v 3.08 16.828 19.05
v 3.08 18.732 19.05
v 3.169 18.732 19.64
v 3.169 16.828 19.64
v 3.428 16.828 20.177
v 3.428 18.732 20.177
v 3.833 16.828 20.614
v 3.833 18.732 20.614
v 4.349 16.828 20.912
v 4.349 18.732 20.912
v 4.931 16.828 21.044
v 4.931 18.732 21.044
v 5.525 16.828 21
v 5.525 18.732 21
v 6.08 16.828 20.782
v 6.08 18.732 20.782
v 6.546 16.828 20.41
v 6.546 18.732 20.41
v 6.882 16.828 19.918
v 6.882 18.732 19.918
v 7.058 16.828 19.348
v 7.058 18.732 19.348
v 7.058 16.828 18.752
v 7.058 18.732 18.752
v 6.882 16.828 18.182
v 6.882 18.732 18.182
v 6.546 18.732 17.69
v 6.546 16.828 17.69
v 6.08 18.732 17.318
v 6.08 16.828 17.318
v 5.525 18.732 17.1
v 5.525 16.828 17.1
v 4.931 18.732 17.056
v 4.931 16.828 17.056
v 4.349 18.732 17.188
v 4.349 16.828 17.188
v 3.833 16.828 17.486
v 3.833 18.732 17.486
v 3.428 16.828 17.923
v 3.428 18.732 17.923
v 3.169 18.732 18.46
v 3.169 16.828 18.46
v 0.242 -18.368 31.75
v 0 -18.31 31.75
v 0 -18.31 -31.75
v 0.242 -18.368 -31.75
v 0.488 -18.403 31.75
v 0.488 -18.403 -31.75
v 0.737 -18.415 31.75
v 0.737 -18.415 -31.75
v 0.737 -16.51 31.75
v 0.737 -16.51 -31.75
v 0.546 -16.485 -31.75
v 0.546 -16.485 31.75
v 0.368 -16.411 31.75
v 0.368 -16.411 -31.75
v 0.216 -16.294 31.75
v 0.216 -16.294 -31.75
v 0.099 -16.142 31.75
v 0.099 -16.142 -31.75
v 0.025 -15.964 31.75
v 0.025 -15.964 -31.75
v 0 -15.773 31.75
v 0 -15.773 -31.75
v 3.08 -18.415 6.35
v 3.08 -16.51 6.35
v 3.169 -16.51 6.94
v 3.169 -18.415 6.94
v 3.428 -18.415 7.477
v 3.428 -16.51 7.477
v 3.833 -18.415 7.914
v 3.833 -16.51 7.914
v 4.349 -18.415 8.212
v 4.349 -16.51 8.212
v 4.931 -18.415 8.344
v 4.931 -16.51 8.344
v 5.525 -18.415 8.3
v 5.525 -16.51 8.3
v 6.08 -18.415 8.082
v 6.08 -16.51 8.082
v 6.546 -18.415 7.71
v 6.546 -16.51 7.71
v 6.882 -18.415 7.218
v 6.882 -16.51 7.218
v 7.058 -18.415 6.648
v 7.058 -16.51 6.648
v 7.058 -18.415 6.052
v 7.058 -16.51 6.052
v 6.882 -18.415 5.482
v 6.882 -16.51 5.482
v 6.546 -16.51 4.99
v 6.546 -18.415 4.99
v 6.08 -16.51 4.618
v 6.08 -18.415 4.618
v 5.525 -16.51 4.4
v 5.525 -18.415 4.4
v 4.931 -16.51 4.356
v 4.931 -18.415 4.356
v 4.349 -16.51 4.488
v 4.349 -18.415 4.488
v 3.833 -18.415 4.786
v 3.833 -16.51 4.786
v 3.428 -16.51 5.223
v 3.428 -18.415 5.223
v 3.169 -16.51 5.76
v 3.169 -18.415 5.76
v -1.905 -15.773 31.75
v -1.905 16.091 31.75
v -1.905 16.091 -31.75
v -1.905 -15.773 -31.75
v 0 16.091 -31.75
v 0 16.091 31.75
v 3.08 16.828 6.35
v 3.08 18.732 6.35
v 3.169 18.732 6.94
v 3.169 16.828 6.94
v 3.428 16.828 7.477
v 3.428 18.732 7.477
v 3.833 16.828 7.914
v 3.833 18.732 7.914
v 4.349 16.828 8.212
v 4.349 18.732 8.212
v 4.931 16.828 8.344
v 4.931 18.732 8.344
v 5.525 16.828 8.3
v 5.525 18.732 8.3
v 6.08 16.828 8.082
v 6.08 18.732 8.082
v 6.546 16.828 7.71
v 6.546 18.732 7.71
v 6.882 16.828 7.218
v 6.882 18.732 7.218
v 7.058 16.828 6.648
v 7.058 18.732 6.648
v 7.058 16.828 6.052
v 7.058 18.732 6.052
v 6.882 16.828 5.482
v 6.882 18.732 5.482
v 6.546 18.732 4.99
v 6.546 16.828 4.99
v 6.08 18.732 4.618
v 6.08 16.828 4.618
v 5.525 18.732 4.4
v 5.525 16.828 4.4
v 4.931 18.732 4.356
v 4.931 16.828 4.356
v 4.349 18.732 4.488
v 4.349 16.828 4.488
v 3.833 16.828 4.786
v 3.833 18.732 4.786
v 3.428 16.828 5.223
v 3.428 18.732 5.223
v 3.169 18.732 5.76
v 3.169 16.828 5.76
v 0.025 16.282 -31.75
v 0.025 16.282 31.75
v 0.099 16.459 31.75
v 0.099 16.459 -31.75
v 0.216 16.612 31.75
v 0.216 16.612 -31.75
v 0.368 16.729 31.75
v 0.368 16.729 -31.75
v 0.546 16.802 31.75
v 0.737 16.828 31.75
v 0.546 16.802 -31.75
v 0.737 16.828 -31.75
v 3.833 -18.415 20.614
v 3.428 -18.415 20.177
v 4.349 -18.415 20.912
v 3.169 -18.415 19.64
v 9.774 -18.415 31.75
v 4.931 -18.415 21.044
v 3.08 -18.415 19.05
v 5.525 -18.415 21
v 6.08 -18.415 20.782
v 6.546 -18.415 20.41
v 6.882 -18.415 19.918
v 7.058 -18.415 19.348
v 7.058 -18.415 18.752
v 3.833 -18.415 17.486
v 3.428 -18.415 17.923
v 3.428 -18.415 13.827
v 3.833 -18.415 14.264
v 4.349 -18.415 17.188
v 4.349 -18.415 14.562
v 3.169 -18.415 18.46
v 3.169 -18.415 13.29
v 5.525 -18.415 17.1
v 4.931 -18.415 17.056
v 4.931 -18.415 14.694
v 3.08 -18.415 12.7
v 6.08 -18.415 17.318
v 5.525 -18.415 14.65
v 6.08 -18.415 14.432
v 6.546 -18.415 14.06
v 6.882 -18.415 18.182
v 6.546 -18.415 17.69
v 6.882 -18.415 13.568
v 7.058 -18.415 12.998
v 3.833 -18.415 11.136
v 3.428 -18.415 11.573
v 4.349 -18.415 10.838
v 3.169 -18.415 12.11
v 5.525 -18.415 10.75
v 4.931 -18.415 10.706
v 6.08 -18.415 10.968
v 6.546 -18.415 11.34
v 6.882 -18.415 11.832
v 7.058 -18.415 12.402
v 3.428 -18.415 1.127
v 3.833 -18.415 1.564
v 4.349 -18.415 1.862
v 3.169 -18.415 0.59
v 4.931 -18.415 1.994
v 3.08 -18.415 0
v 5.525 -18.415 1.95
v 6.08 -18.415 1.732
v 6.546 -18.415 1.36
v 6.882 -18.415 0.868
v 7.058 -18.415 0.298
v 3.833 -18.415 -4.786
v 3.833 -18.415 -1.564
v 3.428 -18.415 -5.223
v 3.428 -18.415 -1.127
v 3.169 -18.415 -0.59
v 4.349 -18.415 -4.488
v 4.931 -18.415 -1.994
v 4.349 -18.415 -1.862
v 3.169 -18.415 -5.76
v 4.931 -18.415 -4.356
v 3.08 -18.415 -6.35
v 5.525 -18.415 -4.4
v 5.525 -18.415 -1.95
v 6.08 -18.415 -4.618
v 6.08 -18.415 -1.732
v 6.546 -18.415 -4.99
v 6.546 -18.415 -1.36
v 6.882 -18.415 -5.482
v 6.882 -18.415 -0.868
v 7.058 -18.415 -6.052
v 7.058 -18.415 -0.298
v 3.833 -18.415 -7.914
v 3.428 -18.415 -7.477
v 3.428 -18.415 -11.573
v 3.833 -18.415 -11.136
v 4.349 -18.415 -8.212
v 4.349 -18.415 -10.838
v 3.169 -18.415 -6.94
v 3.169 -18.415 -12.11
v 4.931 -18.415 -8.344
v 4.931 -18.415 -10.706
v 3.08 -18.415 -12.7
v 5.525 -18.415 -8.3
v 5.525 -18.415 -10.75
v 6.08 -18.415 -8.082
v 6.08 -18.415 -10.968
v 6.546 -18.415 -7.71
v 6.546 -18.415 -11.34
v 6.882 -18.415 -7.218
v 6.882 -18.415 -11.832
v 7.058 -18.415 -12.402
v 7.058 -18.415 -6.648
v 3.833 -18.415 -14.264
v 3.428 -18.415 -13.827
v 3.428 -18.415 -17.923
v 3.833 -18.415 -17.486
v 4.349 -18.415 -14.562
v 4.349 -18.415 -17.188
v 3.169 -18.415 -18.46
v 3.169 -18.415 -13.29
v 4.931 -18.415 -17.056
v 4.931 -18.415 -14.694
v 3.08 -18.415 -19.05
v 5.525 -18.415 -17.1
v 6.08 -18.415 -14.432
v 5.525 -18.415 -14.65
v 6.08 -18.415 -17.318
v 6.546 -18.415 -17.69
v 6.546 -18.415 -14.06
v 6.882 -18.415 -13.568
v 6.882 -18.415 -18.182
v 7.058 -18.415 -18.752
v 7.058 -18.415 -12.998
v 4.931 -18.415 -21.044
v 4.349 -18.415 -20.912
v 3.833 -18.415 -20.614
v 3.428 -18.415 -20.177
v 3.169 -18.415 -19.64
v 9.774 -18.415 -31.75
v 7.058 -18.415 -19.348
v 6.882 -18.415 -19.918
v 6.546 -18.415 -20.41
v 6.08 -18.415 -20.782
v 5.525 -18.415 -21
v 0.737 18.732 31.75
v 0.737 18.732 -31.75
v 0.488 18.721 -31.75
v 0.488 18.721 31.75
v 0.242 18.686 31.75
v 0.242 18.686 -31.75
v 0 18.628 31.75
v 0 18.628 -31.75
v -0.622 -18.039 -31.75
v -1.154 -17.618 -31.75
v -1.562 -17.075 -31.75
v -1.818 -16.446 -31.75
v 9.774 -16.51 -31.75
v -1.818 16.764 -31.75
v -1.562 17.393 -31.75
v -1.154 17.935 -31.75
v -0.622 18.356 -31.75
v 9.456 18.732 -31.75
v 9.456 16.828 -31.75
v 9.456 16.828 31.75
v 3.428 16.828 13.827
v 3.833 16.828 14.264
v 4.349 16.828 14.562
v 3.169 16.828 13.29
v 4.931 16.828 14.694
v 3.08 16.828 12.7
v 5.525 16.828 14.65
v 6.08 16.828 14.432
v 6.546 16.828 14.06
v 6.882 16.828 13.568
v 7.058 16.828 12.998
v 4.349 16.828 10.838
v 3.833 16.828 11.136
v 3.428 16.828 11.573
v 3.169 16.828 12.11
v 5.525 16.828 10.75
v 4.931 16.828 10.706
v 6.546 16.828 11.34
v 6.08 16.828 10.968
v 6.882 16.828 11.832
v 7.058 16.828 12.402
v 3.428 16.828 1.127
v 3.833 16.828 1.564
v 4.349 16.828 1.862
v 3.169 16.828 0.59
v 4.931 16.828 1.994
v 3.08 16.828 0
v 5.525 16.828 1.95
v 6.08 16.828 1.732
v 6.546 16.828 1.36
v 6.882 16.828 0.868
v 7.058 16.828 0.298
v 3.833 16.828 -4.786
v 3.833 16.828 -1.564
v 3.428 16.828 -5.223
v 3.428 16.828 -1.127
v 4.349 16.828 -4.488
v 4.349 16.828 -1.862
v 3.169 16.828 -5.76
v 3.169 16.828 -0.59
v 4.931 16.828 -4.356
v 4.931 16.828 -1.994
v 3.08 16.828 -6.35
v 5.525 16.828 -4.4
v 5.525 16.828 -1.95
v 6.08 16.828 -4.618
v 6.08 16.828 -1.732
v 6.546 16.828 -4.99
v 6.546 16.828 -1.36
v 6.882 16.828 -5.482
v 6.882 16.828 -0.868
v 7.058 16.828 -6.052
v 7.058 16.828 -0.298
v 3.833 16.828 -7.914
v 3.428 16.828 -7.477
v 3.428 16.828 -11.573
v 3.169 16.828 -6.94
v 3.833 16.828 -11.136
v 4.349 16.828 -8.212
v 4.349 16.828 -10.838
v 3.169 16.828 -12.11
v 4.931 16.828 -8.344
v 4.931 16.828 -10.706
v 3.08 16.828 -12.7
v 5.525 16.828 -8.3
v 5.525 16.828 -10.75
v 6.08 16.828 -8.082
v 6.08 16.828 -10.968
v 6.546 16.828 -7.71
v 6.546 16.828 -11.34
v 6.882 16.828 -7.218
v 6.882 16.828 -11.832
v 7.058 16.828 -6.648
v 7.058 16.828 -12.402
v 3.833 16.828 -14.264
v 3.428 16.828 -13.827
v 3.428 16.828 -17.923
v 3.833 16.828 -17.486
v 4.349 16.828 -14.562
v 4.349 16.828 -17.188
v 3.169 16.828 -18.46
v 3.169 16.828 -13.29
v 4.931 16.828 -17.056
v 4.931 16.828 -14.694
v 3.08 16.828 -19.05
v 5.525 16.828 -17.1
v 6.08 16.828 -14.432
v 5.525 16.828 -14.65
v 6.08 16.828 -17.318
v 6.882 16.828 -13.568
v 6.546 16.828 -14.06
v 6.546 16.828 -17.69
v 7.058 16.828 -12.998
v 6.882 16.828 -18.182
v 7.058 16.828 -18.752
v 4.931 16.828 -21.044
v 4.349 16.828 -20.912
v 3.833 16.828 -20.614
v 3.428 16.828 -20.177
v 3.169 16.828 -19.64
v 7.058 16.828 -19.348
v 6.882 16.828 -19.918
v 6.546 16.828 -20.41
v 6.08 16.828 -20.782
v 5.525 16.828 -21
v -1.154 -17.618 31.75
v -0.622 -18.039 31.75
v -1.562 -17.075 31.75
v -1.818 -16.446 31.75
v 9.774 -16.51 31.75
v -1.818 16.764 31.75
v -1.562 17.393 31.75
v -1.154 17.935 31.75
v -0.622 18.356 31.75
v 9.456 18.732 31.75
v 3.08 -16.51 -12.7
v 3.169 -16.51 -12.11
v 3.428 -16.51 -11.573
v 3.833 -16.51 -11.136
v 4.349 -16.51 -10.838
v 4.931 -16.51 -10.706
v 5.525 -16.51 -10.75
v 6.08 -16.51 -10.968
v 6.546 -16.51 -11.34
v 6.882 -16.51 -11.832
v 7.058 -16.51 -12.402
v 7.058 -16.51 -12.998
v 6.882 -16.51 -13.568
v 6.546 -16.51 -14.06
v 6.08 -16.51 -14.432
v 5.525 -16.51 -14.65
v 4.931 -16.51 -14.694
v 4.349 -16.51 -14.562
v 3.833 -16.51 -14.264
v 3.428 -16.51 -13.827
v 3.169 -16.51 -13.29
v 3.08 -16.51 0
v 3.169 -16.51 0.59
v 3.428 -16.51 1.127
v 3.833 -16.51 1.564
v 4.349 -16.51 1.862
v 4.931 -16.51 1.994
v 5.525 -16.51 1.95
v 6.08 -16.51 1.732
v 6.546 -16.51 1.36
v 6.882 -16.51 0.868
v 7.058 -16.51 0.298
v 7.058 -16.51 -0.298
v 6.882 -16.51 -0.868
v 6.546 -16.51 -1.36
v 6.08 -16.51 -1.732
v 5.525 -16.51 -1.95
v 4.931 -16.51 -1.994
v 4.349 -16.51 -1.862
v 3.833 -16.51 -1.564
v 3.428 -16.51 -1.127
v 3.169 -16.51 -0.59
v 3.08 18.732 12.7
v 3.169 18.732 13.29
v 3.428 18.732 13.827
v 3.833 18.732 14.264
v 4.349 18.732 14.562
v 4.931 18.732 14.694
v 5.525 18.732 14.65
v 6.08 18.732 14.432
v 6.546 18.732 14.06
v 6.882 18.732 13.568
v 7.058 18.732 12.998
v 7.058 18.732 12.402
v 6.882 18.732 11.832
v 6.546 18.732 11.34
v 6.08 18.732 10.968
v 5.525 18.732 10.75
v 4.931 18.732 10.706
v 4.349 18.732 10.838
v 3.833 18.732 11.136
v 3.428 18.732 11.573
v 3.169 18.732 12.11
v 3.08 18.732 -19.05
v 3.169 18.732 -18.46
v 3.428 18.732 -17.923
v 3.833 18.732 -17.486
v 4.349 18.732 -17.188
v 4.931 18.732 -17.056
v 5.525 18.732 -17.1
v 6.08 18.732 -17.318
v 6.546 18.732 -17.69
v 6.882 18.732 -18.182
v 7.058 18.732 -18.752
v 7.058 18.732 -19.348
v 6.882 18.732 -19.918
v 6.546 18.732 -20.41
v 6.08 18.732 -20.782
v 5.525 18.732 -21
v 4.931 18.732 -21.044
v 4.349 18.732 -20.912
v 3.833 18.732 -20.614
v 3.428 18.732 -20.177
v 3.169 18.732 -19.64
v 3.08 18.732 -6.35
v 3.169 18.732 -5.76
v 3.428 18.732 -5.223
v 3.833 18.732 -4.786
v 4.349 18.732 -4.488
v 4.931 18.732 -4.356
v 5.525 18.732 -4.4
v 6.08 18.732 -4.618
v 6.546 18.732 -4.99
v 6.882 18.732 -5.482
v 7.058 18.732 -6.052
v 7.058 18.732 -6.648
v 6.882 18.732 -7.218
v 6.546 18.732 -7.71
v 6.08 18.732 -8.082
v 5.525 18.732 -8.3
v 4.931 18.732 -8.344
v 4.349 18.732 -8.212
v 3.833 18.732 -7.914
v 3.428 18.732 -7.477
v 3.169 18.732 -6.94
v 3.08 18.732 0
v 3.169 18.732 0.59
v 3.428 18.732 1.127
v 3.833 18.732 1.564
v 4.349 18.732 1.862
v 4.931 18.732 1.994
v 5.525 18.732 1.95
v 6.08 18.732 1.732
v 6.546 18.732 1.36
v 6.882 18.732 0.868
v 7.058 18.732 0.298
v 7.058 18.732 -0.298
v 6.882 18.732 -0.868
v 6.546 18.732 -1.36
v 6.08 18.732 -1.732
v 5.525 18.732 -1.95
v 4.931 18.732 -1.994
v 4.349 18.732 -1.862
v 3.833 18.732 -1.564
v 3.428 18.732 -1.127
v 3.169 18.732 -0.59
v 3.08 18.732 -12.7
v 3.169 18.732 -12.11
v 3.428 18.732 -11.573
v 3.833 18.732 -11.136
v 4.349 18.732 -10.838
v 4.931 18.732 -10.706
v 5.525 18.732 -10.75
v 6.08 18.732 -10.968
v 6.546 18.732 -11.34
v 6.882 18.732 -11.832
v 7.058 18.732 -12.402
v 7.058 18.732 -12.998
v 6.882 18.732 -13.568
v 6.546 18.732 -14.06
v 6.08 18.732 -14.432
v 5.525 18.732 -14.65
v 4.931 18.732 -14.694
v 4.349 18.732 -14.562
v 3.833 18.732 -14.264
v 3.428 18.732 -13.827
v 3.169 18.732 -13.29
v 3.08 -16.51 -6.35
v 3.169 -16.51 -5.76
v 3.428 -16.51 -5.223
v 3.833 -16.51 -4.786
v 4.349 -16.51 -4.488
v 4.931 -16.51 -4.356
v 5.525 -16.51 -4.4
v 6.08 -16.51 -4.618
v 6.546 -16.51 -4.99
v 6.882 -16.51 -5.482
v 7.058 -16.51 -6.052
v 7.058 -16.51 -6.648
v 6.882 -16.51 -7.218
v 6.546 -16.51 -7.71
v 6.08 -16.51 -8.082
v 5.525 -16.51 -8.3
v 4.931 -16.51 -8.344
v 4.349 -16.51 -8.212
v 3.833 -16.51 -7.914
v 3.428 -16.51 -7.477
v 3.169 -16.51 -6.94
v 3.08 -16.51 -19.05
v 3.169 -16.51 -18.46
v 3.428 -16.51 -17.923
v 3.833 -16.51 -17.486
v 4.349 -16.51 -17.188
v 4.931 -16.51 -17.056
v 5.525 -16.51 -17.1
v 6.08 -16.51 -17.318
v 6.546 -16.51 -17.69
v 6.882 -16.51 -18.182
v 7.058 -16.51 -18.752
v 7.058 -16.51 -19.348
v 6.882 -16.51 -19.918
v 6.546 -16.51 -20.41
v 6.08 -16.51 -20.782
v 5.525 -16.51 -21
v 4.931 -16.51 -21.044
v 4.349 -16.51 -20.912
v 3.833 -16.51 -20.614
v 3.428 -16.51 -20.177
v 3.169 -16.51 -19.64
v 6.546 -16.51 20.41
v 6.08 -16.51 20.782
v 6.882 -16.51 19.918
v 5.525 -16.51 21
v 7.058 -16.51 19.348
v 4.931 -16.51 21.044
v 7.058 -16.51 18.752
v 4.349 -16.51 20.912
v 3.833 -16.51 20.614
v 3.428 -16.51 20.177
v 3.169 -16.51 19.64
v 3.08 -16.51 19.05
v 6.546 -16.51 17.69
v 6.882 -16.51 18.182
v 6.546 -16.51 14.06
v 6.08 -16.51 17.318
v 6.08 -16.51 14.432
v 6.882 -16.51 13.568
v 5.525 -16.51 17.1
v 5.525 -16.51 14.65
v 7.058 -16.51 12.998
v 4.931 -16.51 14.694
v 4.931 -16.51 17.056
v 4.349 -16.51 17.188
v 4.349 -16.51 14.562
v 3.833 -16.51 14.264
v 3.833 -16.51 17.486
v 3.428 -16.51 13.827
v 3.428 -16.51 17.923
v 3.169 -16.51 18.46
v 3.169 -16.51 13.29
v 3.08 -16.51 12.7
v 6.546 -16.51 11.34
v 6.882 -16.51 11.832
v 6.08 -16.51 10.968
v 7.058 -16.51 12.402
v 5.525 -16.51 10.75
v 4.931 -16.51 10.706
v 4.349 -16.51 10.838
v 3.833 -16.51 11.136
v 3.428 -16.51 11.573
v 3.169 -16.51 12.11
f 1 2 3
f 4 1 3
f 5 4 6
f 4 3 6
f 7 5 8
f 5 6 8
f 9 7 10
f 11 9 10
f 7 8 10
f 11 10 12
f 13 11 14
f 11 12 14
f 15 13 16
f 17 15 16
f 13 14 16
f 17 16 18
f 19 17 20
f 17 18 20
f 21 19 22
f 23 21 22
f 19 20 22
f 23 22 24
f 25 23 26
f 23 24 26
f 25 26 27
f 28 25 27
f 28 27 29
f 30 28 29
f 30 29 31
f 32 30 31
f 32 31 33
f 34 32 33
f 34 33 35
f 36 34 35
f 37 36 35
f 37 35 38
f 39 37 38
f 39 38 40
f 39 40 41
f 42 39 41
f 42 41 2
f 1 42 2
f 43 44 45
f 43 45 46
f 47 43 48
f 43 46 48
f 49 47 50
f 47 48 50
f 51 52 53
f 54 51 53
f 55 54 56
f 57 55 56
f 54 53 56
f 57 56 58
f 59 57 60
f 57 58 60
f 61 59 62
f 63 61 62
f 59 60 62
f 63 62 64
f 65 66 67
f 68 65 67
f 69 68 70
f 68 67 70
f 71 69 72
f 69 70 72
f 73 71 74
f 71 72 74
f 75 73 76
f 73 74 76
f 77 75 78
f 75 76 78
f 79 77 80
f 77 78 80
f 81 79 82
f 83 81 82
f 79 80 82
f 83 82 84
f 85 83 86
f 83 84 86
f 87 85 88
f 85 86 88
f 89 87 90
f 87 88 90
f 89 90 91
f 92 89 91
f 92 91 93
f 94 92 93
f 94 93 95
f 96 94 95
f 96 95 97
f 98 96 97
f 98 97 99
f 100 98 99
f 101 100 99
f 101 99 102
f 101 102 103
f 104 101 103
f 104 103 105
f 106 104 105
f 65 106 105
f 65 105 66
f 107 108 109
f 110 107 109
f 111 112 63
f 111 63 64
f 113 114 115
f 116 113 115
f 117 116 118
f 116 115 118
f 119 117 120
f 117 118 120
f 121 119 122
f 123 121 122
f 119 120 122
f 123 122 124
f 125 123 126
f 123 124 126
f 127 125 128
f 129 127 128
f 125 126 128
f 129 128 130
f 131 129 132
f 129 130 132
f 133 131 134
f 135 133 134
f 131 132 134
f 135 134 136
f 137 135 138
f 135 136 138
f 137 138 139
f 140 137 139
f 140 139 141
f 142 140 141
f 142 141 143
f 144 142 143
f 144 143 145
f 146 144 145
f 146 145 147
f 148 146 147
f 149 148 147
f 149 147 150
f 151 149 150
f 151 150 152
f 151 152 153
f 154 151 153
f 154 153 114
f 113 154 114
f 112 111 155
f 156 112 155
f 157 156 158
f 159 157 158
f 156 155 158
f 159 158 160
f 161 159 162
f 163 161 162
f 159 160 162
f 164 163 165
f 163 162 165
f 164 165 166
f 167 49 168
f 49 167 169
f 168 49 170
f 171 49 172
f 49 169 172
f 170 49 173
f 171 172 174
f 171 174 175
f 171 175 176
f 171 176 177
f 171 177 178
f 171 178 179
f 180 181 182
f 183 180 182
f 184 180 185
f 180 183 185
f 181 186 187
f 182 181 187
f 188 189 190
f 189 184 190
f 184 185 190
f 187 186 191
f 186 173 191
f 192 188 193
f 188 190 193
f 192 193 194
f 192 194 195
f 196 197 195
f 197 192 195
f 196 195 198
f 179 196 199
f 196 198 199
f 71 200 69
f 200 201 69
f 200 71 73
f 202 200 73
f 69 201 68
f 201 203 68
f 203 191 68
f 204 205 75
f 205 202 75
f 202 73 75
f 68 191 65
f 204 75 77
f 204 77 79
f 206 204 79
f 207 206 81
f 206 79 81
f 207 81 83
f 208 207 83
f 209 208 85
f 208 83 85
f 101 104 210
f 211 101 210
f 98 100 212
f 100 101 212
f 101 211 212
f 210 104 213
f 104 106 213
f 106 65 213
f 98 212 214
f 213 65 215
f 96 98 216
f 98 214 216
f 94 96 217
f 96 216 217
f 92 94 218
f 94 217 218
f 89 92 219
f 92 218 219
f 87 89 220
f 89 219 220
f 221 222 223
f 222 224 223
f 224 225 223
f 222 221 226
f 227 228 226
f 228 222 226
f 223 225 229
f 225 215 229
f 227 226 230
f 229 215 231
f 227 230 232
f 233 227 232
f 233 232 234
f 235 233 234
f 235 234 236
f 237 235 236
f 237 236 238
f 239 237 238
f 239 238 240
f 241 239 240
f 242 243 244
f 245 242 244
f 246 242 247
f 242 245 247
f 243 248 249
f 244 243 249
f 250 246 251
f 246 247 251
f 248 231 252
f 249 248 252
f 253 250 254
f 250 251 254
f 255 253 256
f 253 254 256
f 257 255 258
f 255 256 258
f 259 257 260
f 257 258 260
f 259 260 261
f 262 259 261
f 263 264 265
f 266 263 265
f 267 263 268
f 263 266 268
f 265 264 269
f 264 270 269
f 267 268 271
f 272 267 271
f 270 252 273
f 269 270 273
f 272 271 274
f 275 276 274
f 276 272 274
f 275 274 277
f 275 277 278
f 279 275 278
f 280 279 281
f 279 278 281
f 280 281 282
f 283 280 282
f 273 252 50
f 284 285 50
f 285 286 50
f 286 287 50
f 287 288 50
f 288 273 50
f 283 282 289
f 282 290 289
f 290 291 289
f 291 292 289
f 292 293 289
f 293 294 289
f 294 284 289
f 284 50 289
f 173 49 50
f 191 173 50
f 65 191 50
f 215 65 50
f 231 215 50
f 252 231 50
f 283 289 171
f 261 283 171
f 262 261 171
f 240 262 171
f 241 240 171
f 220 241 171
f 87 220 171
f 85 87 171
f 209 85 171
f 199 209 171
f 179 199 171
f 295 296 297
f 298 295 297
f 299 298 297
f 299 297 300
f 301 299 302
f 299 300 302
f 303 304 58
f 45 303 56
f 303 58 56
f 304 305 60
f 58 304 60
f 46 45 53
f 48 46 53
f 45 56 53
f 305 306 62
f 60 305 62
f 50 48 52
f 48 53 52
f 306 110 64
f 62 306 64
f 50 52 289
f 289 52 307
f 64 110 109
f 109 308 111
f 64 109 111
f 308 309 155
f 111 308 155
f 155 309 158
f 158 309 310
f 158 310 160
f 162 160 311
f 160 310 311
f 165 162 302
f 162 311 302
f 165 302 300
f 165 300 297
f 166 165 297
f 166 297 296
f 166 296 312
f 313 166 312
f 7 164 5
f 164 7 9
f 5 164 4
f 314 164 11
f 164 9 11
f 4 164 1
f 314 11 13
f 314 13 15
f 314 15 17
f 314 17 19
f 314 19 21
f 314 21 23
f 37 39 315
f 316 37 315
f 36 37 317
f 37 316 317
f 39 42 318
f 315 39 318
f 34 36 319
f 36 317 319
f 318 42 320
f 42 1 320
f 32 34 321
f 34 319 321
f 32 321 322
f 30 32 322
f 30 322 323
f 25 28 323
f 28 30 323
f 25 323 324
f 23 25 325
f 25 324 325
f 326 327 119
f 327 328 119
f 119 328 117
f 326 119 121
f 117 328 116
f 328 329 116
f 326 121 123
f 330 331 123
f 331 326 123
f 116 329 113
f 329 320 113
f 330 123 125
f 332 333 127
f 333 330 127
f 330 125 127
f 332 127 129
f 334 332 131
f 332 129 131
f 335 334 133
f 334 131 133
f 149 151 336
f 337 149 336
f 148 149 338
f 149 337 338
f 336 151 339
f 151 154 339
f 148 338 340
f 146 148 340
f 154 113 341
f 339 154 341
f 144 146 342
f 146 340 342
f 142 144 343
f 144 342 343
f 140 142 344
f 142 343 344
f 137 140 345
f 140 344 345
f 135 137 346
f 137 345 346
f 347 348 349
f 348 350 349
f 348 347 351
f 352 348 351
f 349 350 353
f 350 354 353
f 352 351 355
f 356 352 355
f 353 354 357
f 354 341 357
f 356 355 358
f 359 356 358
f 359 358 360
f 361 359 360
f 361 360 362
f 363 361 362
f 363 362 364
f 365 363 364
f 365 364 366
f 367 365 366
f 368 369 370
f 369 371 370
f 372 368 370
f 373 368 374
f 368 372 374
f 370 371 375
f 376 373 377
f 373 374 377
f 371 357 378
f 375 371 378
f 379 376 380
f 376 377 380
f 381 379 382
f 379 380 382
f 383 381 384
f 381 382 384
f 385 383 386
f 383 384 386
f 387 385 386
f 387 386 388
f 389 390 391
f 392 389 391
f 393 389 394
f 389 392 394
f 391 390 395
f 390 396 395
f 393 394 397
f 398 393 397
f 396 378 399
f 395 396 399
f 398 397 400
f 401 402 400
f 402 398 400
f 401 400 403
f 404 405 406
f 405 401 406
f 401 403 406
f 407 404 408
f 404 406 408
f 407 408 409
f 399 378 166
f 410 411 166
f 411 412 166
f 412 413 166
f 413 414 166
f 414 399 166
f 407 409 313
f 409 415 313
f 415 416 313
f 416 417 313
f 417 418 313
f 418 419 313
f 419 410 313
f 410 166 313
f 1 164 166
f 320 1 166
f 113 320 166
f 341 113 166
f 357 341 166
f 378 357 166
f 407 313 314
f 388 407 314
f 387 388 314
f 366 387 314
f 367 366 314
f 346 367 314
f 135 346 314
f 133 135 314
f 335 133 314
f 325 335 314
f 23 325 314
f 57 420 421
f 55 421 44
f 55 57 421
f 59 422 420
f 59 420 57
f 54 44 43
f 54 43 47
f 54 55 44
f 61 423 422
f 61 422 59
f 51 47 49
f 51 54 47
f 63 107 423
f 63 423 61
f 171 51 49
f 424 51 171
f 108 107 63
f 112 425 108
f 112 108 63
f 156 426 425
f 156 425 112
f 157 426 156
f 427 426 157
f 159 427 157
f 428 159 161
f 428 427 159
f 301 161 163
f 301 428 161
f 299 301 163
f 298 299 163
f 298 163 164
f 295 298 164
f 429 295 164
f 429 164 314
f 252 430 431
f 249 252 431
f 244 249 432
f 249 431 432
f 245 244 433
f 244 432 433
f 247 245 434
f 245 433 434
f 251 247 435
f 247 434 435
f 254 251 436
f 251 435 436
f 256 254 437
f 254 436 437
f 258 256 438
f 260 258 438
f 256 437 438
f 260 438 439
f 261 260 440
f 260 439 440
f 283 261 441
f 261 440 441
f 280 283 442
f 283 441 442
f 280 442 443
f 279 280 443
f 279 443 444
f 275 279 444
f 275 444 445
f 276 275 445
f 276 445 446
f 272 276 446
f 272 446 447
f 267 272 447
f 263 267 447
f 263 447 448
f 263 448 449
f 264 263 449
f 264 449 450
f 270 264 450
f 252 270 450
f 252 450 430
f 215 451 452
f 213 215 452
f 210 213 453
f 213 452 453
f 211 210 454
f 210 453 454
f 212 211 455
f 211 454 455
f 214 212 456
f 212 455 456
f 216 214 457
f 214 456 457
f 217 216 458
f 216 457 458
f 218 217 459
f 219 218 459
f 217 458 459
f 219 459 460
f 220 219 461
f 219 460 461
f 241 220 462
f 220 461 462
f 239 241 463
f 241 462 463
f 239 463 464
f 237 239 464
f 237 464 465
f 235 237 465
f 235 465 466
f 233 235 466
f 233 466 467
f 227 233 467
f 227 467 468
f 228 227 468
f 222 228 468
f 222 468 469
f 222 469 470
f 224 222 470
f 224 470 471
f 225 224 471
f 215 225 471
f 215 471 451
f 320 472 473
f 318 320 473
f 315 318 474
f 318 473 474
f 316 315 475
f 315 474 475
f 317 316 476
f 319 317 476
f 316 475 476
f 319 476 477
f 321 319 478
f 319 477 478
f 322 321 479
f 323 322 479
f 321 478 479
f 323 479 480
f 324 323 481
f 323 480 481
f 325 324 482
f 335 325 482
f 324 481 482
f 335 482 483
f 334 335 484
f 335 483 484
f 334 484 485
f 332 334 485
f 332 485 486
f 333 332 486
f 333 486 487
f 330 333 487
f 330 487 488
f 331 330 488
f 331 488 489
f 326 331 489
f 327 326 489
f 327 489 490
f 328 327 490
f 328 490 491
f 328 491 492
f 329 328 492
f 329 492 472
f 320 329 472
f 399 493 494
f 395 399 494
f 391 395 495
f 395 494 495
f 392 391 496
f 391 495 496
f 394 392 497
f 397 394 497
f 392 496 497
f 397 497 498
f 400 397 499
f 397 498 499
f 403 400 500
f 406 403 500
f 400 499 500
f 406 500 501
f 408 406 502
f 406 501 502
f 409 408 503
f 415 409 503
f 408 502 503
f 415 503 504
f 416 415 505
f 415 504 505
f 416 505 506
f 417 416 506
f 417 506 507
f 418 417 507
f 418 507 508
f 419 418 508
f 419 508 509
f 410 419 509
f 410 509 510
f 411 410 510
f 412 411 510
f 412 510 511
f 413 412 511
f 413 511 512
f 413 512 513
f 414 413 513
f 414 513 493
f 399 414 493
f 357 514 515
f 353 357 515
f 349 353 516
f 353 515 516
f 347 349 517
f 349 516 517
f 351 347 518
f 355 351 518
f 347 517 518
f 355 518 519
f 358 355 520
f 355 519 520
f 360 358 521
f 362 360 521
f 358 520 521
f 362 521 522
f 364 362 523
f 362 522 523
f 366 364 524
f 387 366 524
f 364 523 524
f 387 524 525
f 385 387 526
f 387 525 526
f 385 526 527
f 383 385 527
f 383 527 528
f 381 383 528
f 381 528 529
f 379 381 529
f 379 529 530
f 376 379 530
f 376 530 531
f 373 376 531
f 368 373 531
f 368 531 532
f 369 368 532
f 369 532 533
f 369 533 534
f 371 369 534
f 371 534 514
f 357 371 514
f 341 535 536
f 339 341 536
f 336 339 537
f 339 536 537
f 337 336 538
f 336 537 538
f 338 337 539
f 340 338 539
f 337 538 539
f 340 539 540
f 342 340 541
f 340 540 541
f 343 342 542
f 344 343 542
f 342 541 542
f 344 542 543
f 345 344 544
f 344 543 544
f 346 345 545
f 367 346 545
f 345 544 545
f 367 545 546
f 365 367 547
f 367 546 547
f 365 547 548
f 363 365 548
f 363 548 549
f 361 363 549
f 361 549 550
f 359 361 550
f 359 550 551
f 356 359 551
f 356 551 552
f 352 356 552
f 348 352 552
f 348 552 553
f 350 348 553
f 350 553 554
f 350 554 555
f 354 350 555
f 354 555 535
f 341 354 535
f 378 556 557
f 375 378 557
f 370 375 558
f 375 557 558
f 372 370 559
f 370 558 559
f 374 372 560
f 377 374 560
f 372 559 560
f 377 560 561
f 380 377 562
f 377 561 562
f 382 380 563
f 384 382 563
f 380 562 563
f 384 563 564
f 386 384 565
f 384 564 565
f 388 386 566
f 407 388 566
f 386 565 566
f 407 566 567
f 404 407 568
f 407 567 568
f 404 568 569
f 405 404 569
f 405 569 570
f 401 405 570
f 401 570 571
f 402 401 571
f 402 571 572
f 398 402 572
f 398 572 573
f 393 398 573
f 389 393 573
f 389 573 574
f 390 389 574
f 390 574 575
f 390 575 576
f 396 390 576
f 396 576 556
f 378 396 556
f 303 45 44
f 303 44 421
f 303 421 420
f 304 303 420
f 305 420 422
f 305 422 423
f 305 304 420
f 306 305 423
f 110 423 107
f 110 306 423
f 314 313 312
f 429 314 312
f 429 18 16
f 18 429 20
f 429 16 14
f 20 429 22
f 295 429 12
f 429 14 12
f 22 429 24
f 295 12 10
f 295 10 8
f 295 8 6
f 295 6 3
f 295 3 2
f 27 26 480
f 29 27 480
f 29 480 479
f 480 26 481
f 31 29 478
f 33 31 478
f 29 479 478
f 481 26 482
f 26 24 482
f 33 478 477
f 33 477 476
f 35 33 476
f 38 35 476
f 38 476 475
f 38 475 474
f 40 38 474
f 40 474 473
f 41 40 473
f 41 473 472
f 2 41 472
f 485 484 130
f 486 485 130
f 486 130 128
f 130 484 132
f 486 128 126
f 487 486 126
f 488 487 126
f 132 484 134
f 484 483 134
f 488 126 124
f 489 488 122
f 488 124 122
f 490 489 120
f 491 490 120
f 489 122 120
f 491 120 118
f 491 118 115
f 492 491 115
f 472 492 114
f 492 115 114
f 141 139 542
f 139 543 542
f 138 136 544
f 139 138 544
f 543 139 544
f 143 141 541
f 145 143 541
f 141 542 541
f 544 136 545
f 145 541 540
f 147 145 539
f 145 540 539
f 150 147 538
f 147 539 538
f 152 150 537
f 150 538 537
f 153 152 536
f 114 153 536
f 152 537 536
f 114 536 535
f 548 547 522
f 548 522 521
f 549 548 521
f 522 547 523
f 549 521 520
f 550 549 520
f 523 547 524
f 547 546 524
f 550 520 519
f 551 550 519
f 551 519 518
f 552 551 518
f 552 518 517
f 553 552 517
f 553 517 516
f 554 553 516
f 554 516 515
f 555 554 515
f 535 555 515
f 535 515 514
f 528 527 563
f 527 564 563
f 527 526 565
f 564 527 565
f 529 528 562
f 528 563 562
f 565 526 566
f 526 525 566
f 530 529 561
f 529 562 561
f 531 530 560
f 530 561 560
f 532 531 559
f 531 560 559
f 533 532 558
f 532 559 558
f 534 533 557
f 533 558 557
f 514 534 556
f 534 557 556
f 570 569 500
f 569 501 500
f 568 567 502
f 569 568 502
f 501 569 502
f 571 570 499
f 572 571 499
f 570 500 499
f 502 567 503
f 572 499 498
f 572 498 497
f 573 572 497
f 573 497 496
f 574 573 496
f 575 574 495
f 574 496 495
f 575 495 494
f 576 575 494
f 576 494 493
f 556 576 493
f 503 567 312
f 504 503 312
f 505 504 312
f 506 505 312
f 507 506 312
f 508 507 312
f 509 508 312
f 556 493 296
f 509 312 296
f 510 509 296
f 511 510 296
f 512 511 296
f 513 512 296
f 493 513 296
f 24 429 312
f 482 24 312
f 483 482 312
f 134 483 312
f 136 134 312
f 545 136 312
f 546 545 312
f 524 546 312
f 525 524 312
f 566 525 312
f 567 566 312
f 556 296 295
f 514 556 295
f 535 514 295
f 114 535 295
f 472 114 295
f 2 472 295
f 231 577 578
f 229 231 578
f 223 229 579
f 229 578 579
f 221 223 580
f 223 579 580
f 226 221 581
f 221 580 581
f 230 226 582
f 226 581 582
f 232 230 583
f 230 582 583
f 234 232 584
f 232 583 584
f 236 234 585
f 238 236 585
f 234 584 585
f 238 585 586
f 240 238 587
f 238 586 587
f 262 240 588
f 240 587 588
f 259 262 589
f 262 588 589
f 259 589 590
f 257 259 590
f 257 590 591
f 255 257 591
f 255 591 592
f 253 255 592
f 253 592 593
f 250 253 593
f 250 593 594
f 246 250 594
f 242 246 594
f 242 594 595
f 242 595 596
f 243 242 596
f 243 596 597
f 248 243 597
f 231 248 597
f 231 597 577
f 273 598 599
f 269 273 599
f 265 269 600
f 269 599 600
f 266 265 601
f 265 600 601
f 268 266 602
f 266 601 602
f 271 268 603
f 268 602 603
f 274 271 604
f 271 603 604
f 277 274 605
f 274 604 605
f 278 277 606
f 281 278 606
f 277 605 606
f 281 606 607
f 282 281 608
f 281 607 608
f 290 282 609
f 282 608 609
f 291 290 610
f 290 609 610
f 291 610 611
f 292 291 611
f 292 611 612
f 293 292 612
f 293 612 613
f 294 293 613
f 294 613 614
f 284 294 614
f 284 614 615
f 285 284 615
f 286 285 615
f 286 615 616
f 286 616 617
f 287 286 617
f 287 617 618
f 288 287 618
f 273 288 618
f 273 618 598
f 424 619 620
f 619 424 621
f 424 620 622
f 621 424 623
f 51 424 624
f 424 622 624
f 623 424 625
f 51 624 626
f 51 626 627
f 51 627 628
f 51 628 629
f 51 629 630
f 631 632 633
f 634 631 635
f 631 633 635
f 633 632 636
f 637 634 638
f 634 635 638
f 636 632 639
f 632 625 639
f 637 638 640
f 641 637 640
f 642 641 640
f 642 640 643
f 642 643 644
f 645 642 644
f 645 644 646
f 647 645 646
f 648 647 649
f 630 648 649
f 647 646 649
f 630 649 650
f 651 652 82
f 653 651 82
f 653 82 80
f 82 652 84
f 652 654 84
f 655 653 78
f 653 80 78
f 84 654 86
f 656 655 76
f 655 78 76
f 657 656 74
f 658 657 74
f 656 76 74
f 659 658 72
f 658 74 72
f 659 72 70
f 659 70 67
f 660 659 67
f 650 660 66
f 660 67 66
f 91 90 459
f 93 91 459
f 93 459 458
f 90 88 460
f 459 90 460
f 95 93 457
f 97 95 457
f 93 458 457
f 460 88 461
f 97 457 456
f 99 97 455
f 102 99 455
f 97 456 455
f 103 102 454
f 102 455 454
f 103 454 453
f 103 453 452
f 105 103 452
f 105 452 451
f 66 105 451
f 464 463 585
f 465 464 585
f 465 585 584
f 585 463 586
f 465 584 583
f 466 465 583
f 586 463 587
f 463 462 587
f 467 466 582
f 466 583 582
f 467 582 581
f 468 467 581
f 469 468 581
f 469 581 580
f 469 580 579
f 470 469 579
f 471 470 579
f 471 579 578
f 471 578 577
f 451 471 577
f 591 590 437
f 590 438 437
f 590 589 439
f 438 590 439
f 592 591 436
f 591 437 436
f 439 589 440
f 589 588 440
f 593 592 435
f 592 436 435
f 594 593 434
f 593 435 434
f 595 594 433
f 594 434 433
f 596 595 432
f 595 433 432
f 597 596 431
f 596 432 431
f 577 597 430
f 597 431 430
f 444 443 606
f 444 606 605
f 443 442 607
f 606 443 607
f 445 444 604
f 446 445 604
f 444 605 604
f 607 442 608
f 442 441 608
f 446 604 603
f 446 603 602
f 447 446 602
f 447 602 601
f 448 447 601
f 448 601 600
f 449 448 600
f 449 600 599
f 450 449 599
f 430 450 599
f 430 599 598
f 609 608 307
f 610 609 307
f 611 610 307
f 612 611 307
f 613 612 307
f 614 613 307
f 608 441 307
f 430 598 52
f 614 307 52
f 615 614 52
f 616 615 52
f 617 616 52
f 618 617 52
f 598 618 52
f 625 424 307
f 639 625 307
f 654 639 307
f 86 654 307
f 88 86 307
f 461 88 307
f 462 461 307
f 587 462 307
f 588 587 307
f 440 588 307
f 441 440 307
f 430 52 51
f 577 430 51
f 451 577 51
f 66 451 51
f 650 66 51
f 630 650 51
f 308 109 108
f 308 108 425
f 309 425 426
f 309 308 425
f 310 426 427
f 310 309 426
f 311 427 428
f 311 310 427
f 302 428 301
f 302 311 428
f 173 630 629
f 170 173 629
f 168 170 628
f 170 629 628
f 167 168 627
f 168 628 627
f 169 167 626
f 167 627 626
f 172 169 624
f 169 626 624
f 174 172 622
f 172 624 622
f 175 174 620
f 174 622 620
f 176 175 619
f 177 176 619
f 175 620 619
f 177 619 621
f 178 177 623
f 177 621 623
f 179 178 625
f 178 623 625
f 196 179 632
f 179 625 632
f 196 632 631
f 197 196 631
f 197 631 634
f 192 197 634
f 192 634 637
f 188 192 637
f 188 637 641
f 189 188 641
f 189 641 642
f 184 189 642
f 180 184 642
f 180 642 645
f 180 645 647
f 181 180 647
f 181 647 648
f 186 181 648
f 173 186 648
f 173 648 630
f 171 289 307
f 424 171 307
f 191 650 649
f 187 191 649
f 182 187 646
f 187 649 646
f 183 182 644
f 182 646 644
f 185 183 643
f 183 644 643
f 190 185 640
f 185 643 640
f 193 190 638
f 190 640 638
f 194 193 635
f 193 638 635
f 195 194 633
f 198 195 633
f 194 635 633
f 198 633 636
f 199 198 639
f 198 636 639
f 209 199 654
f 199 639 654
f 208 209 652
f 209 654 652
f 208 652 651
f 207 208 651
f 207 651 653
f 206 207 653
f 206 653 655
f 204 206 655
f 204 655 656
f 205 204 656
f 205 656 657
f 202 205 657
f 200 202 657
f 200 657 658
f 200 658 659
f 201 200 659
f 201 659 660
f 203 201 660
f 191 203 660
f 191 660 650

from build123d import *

# Parameters (mm, degrees)
SKETCH4_W              = 63.5
SKETCH4_H              = 54.9275
BASE_FLANGE1_DEPTH     = 1.905
SKETCHED_START         = -31.75
SKETCHED_BEND3_DEPTH   = 63.5
SKETCHED_BEND3_2_DEPTH = 63.5
CUT_EXTRUDE2_REACH     = 51.835
SKETCH20_R             = 2


# Read off the part's stored shape, not the designer's step: Sketched Bend3
# Sheet-metal steps are written as plain solids
with BuildPart() as part:
    # Sketch4 → Base-Flange1 (new body)
    with BuildSketch(Plane(origin=(0, 0, 0), x_dir=(0, 0, -1), z_dir=(1, 0, 0))):
        Rectangle(SKETCH4_W, SKETCH4_H)
    extrude(amount=-BASE_FLANGE1_DEPTH)

    # Sketched Bend3 outline → Sketched Bend3 (cut)
    with BuildSketch(Plane.XY.offset(SKETCHED_START)):
        with BuildLine():
            ThreePointArc((0, -18.310223013), (-1.375727285, -17.359629491), (-1.905, -15.7734))
            Line((-1.905, -15.7734), (-1.905, -27.46375))
            Line((-1.905, -27.46375), (0, -27.46375))
            Line((0, -27.46375), (0, -18.310223013))
        make_face()
        with BuildLine():
            Line((-1.905, 27.46375), (-1.905, 16.0909))
            ThreePointArc((-1.905, 16.0909), (-1.375727285, 17.677129491), (0, 18.627723013))
            Line((0, 18.627723013), (0, 27.46375))
            Line((0, 27.46375), (-1.905, 27.46375))
        make_face()
    extrude(amount=SKETCHED_BEND3_DEPTH, mode=Mode.SUBTRACT)

    # Sketched Bend3 2 outline → Sketched Bend3 2 (add)
    with BuildSketch(Plane.XY.offset(SKETCHED_START)):
        with BuildLine():
            Line((0, -15.7734), (0, -18.310223013))
            ThreePointArc((0, -18.310223013), (0.364592683, -18.388674577), (0.7366, -18.415))
            Line((0.7366, -18.415), (9.773717924, -18.415))
            Line((9.773717924, -18.415), (9.773717924, -16.51))
            Line((9.773717924, -16.51), (0.7366, -16.51))
            ThreePointArc((0.7366, -16.51), (0.215745145, -16.294254855), (0, -15.7734))
        make_face()
        with BuildLine():
            ThreePointArc((0.7366, 18.7325), (0.364592683, 18.706174577), (0, 18.627723013))
            Line((0, 18.627723013), (0, 16.0909))
            ThreePointArc((0, 16.0909), (0.215745145, 16.611754855), (0.7366, 16.8275))
            Line((0.7366, 16.8275), (9.456217924, 16.8275))
            Line((9.456217924, 16.8275), (9.456217924, 18.7325))
            Line((9.456217924, 18.7325), (0.7366, 18.7325))
        make_face()
    extrude(amount=SKETCHED_BEND3_2_DEPTH)

    # Cut-Extrude2: up to this face of the body (flat: up to its plane)
    cut_extrude2_end = Plane(part.part.faces().sort_by_distance((5.255158962, -18.415, 0))[0])
    # Sketch20 → Cut-Extrude2 (cut, up to the picked face)
    with BuildSketch(Plane(origin=(0, 18.7325, 0), x_dir=(1, 0, 0), z_dir=(0, 1, 0)), mode=Mode.PRIVATE) as cut_extrude2_sk1:
        with Locations(Location((5.08, -6.35, 0), (0, 0, 180))):
            Circle(SKETCH20_R)
    cut_extrude2_tool1 = split(extrude(cut_extrude2_sk1.sketch, amount=-CUT_EXTRUDE2_REACH, mode=Mode.PRIVATE), bisect_by=cut_extrude2_end, keep=Keep.BOTH, mode=Mode.PRIVATE)
    # Sketch20 → Cut-Extrude2 (cut, up to the picked face)
    with BuildSketch(Plane(origin=(0, 18.7325, 0), x_dir=(1, 0, 0), z_dir=(0, 1, 0)), mode=Mode.PRIVATE) as cut_extrude2_sk2:
        with Locations(Location((5.08, 0, 0), (0, 0, 180))):
            Circle(SKETCH20_R)
    cut_extrude2_tool2 = split(extrude(cut_extrude2_sk2.sketch, amount=-CUT_EXTRUDE2_REACH, mode=Mode.PRIVATE), bisect_by=cut_extrude2_end, keep=Keep.BOTH, mode=Mode.PRIVATE)
    # Sketch20 → Cut-Extrude2 (cut, up to the picked face)
    with BuildSketch(Plane(origin=(0, 18.7325, 0), x_dir=(1, 0, 0), z_dir=(0, 1, 0)), mode=Mode.PRIVATE) as cut_extrude2_sk3:
        with Locations(Location((5.08, 6.35, 0), (0, 0, 180))):
            Circle(SKETCH20_R)
    cut_extrude2_tool3 = split(extrude(cut_extrude2_sk3.sketch, amount=-CUT_EXTRUDE2_REACH, mode=Mode.PRIVATE), bisect_by=cut_extrude2_end, keep=Keep.BOTH, mode=Mode.PRIVATE)
    # Sketch20 → Cut-Extrude2 (cut, up to the picked face)
    with BuildSketch(Plane(origin=(0, 18.7325, 0), x_dir=(1, 0, 0), z_dir=(0, 1, 0)), mode=Mode.PRIVATE) as cut_extrude2_sk4:
        with Locations(Location((5.08, 12.7, 0), (0, 0, 180))):
            Circle(SKETCH20_R)
    cut_extrude2_tool4 = split(extrude(cut_extrude2_sk4.sketch, amount=-CUT_EXTRUDE2_REACH, mode=Mode.PRIVATE), bisect_by=cut_extrude2_end, keep=Keep.BOTH, mode=Mode.PRIVATE)
    # Sketch20 → Cut-Extrude2 (cut, up to the picked face)
    with BuildSketch(Plane(origin=(0, 18.7325, 0), x_dir=(1, 0, 0), z_dir=(0, 1, 0)), mode=Mode.PRIVATE) as cut_extrude2_sk5:
        with Locations(Location((5.08, 19.05, 0), (0, 0, 180))):
            Circle(SKETCH20_R)
    cut_extrude2_tool5 = split(extrude(cut_extrude2_sk5.sketch, amount=-CUT_EXTRUDE2_REACH, mode=Mode.PRIVATE), bisect_by=cut_extrude2_end, keep=Keep.BOTH, mode=Mode.PRIVATE)
    # Sketch20 → Cut-Extrude2 (cut, up to the picked face)
    with BuildSketch(Plane(origin=(0, 18.7325, 0), x_dir=(1, 0, 0), z_dir=(0, 1, 0)), mode=Mode.PRIVATE) as cut_extrude2_sk6:
        with Locations(Location((5.08, -12.7, 0), (0, 0, 180))):
            Circle(SKETCH20_R)
    cut_extrude2_tool6 = split(extrude(cut_extrude2_sk6.sketch, amount=-CUT_EXTRUDE2_REACH, mode=Mode.PRIVATE), bisect_by=cut_extrude2_end, keep=Keep.BOTH, mode=Mode.PRIVATE)
    # Sketch20 → Cut-Extrude2 (cut, up to the picked face)
    with BuildSketch(Plane(origin=(0, 18.7325, 0), x_dir=(1, 0, 0), z_dir=(0, 1, 0)), mode=Mode.PRIVATE) as cut_extrude2_sk7:
        with Locations(Location((5.08, -19.05, 0), (0, 0, 180))):
            Circle(SKETCH20_R)
    cut_extrude2_tool7 = split(extrude(cut_extrude2_sk7.sketch, amount=-CUT_EXTRUDE2_REACH, mode=Mode.PRIVATE), bisect_by=cut_extrude2_end, keep=Keep.BOTH, mode=Mode.PRIVATE)
    add(cut_extrude2_tool1.solids().sort_by(Axis((5.08, 18.7325, 6.35), (0, -1, 0)))[0], mode=Mode.SUBTRACT)
    add(cut_extrude2_tool2.solids().sort_by(Axis((5.08, 18.7325, 0), (0, -1, 0)))[0], mode=Mode.SUBTRACT)
    add(cut_extrude2_tool3.solids().sort_by(Axis((5.08, 18.7325, -6.35), (0, -1, 0)))[0], mode=Mode.SUBTRACT)
    add(cut_extrude2_tool4.solids().sort_by(Axis((5.08, 18.7325, -12.7), (0, -1, 0)))[0], mode=Mode.SUBTRACT)
    add(cut_extrude2_tool5.solids().sort_by(Axis((5.08, 18.7325, -19.05), (0, -1, 0)))[0], mode=Mode.SUBTRACT)
    add(cut_extrude2_tool6.solids().sort_by(Axis((5.08, 18.7325, 12.7), (0, -1, 0)))[0], mode=Mode.SUBTRACT)
    add(cut_extrude2_tool7.solids().sort_by(Axis((5.08, 18.7325, 19.05), (0, -1, 0)))[0], mode=Mode.SUBTRACT)


solid = part.part
